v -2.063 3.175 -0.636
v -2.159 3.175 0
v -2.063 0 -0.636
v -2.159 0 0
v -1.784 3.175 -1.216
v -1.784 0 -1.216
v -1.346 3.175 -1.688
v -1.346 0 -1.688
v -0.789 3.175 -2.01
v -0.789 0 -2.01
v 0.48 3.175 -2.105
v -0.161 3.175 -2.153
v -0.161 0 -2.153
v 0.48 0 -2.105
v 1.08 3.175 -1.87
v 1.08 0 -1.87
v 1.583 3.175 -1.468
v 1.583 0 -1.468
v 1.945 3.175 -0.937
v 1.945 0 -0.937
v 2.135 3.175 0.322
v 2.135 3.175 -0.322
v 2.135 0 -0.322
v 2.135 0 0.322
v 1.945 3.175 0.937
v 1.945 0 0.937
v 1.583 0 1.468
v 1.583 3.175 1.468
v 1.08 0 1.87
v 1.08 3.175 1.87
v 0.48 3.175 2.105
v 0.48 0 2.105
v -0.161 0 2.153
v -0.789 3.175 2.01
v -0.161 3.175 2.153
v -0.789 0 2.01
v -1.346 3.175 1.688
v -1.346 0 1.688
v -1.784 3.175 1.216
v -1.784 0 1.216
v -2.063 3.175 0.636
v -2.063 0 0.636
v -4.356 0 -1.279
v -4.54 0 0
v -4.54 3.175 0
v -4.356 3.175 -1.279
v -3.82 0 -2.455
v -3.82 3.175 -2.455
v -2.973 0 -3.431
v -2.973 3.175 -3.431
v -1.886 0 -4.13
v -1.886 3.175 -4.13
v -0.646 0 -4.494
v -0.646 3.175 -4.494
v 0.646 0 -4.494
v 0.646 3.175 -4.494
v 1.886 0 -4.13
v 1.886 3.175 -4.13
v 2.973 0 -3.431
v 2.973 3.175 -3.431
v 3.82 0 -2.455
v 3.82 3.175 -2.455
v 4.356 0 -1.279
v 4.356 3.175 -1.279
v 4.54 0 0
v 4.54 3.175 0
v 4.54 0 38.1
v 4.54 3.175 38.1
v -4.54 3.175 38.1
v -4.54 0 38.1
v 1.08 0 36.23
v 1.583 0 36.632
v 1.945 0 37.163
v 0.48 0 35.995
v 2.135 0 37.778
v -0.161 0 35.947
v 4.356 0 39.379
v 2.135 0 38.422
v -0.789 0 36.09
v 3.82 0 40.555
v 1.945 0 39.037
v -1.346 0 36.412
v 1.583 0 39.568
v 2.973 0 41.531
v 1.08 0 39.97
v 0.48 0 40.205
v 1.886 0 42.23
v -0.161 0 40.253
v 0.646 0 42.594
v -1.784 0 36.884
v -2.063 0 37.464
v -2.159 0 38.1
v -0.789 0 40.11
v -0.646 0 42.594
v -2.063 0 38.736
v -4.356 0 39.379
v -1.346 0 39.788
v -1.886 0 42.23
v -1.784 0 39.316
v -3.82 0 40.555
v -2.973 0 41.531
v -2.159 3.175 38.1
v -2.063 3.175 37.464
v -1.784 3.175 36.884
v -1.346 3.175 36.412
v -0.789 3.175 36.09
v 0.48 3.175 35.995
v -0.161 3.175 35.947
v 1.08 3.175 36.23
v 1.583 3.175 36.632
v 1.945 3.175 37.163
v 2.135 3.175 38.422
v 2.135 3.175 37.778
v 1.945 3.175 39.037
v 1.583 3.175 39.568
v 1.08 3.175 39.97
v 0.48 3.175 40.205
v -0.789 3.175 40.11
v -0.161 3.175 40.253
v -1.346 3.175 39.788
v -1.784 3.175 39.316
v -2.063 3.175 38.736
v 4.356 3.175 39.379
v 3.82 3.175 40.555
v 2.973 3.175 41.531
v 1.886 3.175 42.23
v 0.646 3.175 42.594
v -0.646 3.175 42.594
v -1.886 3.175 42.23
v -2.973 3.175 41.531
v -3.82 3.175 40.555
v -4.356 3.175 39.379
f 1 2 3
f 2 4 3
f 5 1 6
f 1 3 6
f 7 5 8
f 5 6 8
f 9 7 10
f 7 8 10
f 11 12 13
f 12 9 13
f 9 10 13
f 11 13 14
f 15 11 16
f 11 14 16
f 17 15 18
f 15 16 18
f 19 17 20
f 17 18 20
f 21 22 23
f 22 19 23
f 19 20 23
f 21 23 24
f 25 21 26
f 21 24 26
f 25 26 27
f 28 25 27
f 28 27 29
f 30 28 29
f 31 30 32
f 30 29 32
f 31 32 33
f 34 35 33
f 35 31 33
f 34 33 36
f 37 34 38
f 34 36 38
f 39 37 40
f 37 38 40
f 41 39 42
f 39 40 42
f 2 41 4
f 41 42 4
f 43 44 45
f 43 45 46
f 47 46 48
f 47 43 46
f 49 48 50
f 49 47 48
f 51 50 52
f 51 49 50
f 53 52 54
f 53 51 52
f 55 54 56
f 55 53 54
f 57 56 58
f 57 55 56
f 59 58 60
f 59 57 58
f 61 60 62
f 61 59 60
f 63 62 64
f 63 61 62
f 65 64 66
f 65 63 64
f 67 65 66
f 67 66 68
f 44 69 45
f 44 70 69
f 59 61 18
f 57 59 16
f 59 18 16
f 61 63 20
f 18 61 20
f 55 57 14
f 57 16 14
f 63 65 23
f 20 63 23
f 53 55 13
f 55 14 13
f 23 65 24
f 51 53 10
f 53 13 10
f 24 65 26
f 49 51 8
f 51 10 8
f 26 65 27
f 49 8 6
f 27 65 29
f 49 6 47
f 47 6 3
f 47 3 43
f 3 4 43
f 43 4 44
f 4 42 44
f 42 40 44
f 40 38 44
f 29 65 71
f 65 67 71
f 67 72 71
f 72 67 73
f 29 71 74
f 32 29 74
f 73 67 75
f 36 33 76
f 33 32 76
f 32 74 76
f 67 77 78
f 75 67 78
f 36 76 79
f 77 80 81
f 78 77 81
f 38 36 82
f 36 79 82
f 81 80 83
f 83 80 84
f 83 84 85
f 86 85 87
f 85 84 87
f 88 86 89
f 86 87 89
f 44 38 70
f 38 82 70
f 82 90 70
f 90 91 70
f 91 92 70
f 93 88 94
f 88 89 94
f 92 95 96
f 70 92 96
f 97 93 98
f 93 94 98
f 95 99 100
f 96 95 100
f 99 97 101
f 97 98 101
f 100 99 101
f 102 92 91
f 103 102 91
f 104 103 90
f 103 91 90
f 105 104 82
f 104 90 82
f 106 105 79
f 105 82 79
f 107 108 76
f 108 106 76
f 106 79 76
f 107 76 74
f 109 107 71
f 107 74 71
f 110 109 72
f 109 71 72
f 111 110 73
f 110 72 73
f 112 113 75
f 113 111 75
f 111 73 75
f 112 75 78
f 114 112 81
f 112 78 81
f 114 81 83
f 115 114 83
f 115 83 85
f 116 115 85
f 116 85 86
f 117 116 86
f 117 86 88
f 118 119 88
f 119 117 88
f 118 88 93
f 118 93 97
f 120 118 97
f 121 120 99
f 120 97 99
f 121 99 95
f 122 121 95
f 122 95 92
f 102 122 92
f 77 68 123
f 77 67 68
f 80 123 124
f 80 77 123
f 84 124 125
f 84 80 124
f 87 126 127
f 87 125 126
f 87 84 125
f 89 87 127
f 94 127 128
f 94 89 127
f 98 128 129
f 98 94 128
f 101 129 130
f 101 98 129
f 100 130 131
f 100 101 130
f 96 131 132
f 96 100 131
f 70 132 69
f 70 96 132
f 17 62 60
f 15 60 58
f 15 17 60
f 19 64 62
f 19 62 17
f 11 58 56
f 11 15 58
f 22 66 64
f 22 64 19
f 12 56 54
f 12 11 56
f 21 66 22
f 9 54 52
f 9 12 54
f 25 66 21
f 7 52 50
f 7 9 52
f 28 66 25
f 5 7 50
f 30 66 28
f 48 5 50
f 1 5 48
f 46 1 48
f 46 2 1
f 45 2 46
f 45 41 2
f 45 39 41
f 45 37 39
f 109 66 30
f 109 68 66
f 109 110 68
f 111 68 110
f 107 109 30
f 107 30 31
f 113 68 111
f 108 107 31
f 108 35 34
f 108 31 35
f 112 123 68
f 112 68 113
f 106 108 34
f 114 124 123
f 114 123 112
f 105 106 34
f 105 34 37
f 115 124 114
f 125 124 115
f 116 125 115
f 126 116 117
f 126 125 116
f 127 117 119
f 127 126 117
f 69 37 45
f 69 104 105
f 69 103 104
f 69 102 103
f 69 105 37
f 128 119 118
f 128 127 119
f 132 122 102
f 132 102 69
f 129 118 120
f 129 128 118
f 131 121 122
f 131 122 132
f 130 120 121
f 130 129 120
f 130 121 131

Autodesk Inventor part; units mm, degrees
ref_plane "YZ Plane" through (0, 0, 0) normal (1, 0, 0) x (0, 1, 0)
ref_plane "XZ Plane" through (0, 0, 0) normal (0, 1, 0) x (-1, 0, 0)
ref_plane "XY Plane" through (0, 0, 0) normal (0, 0, 1) x (1, 0, 0)
sketch "Sketch1" plane through (0, 0, 0) normal (0, 1, 0) x (-1, 0, 0)
  circle A0 centre (0, 0) radius 2.159
  circle A1 centre (0, 38.1) radius 2.159
  circle A2 centre (0, 38.1) radius 4.5403
  circle A3 centre (0, 0) radius 4.5403
  line L0 (4.5403, 38.1) -> (4.5402, 0)
  line L1 (-4.5403, 0) -> (-4.5403, 38.1)
  dimension "d0" = 4.318
  dimension "d1" = 4.318
  dimension "d2" = 38.1
  dimension "d3" = 2.3813
  dimension "d4" = 2.3813
extrude "Extrusion1" add sketch "Sketch1" along normal blind 3.175
properties part number "Arm for thingy"
